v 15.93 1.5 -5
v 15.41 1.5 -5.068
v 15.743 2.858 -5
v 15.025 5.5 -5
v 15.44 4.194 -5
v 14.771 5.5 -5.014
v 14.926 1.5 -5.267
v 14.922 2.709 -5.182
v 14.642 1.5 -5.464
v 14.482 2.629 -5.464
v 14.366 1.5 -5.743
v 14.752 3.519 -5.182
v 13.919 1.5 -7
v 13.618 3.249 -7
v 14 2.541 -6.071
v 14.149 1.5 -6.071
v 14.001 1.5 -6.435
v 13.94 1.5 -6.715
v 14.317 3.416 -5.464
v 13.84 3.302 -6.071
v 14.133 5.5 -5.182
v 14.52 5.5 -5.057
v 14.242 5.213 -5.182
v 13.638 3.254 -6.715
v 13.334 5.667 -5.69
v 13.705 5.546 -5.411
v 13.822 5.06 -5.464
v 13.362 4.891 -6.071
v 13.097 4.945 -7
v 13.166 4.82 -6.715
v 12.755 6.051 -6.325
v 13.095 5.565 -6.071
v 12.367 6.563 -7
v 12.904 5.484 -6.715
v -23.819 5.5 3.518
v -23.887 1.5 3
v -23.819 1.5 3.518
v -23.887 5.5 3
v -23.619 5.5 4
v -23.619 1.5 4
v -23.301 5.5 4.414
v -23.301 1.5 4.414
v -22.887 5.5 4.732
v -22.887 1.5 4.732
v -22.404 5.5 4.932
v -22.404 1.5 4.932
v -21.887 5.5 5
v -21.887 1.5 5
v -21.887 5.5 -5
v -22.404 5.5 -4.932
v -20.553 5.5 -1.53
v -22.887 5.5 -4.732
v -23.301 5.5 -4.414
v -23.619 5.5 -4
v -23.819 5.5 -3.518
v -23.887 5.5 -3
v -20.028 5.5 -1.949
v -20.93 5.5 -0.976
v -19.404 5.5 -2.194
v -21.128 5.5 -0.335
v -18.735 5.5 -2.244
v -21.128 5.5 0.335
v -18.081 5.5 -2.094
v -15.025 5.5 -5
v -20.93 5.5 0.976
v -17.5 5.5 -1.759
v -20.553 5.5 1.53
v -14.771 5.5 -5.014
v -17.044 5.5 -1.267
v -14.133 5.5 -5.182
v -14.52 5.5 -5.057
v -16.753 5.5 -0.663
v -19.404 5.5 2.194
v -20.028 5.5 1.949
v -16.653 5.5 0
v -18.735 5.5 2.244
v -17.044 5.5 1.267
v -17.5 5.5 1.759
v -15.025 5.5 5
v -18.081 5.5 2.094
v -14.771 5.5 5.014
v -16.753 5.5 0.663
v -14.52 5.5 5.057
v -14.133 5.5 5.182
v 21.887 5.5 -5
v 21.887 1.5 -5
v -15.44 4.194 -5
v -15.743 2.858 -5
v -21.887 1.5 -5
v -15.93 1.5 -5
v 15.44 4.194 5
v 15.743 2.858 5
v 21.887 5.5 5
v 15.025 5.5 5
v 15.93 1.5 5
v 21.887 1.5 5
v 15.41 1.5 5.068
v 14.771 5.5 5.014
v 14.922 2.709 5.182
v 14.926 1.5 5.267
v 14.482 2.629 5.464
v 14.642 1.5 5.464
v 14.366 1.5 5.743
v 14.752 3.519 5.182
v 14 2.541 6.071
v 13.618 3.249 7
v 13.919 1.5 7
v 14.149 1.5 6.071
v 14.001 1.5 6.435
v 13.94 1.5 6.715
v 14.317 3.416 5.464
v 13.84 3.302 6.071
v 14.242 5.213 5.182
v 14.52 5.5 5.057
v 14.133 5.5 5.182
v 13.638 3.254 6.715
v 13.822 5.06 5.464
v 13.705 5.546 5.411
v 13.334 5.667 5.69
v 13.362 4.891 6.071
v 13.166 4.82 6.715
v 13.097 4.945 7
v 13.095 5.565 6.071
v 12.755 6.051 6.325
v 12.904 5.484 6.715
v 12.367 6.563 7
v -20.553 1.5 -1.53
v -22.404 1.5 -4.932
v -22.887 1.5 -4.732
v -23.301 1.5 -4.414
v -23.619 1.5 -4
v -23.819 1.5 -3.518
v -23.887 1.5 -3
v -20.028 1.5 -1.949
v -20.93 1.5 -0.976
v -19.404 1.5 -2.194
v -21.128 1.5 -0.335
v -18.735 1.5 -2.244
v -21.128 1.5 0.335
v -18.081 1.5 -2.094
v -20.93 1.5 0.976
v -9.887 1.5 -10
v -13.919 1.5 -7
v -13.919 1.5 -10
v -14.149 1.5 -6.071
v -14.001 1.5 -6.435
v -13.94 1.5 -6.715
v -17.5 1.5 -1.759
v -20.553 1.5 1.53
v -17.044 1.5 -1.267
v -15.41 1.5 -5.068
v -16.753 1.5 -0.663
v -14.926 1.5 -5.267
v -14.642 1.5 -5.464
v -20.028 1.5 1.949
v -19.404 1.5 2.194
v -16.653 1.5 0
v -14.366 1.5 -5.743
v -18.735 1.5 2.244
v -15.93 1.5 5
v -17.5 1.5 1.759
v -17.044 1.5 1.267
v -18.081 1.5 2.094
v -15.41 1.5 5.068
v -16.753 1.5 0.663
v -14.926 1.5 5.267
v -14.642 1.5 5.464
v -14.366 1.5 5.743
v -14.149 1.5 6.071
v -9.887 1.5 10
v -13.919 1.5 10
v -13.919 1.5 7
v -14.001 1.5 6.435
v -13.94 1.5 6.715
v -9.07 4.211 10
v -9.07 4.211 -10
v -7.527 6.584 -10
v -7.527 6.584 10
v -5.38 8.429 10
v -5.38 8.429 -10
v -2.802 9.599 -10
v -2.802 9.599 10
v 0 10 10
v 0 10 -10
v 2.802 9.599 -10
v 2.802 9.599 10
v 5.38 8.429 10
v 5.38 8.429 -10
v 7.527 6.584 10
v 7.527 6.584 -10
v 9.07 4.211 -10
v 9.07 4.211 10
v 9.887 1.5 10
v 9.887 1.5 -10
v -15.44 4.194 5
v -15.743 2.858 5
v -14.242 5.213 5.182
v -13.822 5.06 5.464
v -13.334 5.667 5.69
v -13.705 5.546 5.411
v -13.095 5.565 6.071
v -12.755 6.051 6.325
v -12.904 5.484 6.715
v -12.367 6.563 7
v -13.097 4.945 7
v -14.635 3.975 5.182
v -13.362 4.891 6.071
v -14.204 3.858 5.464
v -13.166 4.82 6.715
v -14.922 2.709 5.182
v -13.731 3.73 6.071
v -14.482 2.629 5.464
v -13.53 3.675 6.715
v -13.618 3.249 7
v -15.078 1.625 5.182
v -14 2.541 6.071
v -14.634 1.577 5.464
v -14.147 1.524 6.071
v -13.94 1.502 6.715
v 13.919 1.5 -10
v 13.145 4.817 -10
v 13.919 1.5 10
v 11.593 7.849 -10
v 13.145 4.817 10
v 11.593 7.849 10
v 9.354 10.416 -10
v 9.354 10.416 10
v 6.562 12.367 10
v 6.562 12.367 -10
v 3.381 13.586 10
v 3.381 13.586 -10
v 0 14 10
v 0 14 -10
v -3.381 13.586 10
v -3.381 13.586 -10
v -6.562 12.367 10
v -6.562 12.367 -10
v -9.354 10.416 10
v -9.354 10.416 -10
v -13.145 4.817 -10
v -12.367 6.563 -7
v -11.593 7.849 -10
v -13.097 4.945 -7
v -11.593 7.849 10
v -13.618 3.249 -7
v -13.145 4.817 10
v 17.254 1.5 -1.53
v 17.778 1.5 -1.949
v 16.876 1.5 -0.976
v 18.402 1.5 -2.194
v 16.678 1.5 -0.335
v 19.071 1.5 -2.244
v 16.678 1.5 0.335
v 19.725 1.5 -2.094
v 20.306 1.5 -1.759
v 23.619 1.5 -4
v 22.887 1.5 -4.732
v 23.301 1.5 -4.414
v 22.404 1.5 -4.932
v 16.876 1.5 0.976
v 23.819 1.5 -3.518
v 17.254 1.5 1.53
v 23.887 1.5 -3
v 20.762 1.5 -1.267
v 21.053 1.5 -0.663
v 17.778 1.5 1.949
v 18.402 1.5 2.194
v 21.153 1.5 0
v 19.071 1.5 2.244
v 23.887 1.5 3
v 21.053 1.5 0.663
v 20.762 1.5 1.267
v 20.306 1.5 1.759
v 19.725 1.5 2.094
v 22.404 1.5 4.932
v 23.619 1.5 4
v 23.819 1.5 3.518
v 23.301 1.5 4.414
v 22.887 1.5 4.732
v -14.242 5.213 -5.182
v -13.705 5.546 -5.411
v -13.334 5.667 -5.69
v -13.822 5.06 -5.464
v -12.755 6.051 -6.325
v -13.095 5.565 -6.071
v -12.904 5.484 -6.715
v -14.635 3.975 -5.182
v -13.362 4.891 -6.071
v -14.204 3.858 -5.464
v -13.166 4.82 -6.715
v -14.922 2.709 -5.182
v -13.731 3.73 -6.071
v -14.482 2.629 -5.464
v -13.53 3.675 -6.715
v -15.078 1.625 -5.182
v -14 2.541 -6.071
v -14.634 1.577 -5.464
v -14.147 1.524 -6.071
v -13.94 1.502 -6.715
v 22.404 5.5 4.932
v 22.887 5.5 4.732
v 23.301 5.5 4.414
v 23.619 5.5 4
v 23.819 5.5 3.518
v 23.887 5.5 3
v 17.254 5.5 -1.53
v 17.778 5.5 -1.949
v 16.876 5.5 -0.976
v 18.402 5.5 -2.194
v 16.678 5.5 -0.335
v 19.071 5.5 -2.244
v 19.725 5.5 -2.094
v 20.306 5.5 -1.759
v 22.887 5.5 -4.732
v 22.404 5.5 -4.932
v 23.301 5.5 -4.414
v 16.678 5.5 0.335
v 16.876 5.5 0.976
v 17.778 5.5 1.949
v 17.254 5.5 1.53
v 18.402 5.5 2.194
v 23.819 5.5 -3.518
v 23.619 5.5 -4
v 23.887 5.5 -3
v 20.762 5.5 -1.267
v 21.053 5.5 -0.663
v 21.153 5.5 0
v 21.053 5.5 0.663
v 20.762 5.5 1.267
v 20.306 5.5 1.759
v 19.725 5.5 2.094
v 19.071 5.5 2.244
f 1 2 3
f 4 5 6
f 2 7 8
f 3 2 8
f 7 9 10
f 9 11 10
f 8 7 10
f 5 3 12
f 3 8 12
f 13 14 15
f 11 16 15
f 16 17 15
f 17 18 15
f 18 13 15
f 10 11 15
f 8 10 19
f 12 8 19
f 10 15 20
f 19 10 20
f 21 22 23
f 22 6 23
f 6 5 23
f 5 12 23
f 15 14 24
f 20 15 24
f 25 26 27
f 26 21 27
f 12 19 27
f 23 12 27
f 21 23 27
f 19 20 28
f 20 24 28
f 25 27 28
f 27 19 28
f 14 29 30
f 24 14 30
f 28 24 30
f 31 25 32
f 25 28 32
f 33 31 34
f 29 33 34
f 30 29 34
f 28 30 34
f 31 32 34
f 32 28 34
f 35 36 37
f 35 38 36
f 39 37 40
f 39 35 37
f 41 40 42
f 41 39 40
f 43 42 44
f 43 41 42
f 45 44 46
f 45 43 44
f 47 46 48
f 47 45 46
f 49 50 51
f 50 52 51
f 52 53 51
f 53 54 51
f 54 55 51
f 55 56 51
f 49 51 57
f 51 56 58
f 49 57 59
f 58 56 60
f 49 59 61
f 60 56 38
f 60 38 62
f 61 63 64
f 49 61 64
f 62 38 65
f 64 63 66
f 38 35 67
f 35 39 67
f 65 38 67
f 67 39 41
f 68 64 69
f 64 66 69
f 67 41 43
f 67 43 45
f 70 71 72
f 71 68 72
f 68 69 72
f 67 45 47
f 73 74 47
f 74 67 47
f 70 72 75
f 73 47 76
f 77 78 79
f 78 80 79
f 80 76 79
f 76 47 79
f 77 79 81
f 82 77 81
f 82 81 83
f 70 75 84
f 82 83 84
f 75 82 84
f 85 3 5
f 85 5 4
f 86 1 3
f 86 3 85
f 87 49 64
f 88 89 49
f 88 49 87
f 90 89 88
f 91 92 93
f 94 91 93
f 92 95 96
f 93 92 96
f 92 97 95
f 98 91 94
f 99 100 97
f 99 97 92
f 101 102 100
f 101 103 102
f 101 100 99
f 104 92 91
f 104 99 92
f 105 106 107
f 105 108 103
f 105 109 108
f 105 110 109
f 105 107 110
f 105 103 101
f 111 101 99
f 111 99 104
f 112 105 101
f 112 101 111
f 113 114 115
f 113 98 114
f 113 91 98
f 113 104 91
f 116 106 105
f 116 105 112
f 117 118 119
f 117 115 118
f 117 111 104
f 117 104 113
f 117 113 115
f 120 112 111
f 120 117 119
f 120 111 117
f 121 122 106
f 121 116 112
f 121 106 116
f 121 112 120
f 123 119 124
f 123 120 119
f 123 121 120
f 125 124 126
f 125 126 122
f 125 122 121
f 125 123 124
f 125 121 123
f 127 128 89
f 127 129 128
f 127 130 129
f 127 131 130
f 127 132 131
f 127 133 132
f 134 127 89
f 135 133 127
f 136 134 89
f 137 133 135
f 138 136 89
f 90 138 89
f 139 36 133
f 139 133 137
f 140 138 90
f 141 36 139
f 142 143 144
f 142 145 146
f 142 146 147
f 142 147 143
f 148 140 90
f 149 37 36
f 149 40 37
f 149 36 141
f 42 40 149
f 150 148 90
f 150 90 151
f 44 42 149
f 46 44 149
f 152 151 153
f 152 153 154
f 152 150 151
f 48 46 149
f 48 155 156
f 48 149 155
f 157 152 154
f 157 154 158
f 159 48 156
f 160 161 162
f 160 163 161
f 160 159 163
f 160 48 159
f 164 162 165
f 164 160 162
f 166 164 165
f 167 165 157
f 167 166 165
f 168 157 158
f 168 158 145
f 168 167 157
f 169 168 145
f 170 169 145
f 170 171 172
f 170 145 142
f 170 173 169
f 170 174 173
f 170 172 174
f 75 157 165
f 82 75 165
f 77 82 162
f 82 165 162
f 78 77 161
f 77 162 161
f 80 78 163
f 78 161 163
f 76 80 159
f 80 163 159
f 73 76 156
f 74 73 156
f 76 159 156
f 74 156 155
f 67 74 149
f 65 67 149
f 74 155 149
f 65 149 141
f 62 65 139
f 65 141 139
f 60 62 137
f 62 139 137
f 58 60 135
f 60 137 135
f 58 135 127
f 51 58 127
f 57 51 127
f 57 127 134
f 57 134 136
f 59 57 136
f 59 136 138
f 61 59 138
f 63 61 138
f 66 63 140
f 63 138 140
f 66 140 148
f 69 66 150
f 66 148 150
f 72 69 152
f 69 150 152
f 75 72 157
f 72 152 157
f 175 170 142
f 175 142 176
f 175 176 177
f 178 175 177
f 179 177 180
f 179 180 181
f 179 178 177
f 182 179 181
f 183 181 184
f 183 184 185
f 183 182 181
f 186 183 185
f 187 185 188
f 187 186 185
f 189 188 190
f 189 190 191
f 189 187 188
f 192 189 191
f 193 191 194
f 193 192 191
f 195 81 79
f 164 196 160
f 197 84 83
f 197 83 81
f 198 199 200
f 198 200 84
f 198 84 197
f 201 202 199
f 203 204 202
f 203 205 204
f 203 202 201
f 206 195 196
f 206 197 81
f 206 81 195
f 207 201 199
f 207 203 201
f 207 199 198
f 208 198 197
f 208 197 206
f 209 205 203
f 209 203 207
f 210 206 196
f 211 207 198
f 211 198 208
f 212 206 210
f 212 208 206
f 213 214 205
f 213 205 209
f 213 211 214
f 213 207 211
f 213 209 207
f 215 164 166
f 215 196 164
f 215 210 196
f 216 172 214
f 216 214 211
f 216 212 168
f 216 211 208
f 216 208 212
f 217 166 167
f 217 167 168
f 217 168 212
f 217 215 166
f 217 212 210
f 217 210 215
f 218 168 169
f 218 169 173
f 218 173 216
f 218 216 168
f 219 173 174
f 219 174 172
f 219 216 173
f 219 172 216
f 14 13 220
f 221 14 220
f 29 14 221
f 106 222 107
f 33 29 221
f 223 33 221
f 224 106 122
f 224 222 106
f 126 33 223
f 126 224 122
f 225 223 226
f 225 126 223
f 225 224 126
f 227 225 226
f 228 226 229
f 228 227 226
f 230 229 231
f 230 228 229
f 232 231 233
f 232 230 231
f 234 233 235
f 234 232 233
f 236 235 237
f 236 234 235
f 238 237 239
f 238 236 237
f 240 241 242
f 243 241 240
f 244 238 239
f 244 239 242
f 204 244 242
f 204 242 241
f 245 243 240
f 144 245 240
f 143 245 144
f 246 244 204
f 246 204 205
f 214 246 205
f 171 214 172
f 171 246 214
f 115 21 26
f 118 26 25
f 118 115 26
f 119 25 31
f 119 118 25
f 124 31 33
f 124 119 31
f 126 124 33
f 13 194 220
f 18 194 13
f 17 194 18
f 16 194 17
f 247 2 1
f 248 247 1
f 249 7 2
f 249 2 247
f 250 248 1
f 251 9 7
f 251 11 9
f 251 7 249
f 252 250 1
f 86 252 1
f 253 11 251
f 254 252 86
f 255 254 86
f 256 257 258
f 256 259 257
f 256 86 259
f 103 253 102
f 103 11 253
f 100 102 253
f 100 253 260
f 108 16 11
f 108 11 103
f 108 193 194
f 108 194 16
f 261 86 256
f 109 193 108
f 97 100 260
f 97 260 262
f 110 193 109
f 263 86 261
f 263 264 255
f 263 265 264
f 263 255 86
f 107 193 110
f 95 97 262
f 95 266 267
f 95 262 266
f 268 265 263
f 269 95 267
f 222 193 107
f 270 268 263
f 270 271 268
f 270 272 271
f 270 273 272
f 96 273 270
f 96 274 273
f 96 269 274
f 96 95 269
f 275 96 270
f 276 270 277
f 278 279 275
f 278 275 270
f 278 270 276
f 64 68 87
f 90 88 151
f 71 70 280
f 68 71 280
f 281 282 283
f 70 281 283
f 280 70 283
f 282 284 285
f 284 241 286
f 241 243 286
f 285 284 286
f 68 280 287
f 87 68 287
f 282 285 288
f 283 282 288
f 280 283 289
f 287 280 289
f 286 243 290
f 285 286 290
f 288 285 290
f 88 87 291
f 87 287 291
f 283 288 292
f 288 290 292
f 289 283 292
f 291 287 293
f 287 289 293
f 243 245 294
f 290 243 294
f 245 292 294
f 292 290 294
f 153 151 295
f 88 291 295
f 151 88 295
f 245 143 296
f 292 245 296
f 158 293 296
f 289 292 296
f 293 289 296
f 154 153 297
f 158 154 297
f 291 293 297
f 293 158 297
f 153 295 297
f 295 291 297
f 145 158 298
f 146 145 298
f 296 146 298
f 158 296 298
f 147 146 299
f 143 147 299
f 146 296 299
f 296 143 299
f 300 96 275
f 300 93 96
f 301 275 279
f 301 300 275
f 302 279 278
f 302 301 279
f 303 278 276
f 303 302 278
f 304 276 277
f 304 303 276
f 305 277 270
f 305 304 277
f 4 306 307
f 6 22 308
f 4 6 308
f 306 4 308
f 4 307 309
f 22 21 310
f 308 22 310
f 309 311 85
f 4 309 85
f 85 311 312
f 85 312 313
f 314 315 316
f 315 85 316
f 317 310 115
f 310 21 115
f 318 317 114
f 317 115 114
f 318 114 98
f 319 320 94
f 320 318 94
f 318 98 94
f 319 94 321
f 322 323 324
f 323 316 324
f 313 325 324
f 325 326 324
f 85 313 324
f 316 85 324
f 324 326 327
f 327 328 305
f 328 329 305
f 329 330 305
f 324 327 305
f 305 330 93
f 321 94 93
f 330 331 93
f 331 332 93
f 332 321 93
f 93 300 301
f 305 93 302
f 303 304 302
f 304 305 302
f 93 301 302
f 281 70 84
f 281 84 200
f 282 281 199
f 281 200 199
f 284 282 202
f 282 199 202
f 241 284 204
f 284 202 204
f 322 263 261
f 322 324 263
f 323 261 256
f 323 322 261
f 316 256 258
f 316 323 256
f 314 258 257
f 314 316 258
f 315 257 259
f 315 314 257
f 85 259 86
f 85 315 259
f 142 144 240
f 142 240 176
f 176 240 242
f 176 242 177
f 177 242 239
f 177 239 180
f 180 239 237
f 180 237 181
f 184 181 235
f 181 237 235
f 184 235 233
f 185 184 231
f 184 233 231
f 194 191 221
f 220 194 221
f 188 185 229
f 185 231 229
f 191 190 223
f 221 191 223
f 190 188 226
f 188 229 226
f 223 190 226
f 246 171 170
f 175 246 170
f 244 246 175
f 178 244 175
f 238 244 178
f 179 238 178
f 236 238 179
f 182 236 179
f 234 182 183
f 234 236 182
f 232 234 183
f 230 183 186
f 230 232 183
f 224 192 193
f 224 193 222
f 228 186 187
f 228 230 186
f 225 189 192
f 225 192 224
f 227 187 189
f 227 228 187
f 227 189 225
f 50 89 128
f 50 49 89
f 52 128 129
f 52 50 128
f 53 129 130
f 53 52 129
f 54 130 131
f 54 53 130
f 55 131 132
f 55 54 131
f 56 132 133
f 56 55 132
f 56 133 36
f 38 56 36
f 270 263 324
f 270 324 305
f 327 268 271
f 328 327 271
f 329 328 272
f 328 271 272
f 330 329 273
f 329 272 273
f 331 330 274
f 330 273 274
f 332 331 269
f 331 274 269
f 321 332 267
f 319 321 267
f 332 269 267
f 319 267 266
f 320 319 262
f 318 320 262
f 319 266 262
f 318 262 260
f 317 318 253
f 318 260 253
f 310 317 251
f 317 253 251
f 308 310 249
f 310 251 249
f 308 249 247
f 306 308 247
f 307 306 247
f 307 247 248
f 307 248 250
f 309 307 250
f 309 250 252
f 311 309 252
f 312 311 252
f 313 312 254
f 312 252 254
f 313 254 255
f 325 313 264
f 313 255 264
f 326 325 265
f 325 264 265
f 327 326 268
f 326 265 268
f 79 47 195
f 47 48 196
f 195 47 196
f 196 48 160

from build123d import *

# Parameters (mm, degrees)
BOSS_EXTRUDE1_DEPTH = 10
SKETCH2_W           = 14
SKETCH2_H           = 10
SKETCH2_R           = 2.25
BOSS_EXTRUDE2_DEPTH = 4
FILLET1_R           = 2


with BuildPart() as part:
    # Sketch1 → Boss-Extrude1 (new body, symmetric)
    with BuildSketch(Plane.XY):
        with BuildLine():
            Line((-13.919410907, 1.5), (-9.886859967, 1.5))
            ThreePointArc((-9.886859967, 1.5), (0, 10), (9.886859967, 1.5))
            Line((9.886859967, 1.5), (13.919410907, 1.5))
            ThreePointArc((13.919410907, 1.5), (0, 14), (-13.919410907, 1.5))
        make_face()
    extrude(amount=BOSS_EXTRUDE1_DEPTH, both=True)

    # Sketch2 → Boss-Extrude2 (add)
    with BuildSketch(Plane.XZ.offset(-1.5)):
        with Locations((16.886859967, 0)):
            Rectangle(SKETCH2_W, SKETCH2_H)
        with Locations((18.903135437, 0)):
            Circle(SKETCH2_R, mode=Mode.SUBTRACT)
        with Locations((-16.886859967, 0)):
            Rectangle(SKETCH2_W, SKETCH2_H)
        with Locations((-18.903135437, 0)):
            Circle(SKETCH2_R, mode=Mode.SUBTRACT)
    extrude(amount=-BOSS_EXTRUDE2_DEPTH)

    # Fillet1
    fillet1_edges = [part.edges().sort_by_distance(p)[0] for p in [
        (-12.87439319, 5.5, 0),
        (12.87439319, 5.5, 0),
        (13.54536764, 3.538787293, -5),
        (13.54536764, 3.538787293, 5),
        (23.886859967, 3.5, 5),
        (23.886859967, 3.5, -5),
        (-23.886859967, 3.5, 5),
        (-13.54536764, 3.538787293, -5),
        (-23.886859967, 3.5, -5),
        (-13.54536764, 3.538787293, 5),
    ]]
    fillet(fillet1_edges, radius=FILLET1_R)


solid = part.part
